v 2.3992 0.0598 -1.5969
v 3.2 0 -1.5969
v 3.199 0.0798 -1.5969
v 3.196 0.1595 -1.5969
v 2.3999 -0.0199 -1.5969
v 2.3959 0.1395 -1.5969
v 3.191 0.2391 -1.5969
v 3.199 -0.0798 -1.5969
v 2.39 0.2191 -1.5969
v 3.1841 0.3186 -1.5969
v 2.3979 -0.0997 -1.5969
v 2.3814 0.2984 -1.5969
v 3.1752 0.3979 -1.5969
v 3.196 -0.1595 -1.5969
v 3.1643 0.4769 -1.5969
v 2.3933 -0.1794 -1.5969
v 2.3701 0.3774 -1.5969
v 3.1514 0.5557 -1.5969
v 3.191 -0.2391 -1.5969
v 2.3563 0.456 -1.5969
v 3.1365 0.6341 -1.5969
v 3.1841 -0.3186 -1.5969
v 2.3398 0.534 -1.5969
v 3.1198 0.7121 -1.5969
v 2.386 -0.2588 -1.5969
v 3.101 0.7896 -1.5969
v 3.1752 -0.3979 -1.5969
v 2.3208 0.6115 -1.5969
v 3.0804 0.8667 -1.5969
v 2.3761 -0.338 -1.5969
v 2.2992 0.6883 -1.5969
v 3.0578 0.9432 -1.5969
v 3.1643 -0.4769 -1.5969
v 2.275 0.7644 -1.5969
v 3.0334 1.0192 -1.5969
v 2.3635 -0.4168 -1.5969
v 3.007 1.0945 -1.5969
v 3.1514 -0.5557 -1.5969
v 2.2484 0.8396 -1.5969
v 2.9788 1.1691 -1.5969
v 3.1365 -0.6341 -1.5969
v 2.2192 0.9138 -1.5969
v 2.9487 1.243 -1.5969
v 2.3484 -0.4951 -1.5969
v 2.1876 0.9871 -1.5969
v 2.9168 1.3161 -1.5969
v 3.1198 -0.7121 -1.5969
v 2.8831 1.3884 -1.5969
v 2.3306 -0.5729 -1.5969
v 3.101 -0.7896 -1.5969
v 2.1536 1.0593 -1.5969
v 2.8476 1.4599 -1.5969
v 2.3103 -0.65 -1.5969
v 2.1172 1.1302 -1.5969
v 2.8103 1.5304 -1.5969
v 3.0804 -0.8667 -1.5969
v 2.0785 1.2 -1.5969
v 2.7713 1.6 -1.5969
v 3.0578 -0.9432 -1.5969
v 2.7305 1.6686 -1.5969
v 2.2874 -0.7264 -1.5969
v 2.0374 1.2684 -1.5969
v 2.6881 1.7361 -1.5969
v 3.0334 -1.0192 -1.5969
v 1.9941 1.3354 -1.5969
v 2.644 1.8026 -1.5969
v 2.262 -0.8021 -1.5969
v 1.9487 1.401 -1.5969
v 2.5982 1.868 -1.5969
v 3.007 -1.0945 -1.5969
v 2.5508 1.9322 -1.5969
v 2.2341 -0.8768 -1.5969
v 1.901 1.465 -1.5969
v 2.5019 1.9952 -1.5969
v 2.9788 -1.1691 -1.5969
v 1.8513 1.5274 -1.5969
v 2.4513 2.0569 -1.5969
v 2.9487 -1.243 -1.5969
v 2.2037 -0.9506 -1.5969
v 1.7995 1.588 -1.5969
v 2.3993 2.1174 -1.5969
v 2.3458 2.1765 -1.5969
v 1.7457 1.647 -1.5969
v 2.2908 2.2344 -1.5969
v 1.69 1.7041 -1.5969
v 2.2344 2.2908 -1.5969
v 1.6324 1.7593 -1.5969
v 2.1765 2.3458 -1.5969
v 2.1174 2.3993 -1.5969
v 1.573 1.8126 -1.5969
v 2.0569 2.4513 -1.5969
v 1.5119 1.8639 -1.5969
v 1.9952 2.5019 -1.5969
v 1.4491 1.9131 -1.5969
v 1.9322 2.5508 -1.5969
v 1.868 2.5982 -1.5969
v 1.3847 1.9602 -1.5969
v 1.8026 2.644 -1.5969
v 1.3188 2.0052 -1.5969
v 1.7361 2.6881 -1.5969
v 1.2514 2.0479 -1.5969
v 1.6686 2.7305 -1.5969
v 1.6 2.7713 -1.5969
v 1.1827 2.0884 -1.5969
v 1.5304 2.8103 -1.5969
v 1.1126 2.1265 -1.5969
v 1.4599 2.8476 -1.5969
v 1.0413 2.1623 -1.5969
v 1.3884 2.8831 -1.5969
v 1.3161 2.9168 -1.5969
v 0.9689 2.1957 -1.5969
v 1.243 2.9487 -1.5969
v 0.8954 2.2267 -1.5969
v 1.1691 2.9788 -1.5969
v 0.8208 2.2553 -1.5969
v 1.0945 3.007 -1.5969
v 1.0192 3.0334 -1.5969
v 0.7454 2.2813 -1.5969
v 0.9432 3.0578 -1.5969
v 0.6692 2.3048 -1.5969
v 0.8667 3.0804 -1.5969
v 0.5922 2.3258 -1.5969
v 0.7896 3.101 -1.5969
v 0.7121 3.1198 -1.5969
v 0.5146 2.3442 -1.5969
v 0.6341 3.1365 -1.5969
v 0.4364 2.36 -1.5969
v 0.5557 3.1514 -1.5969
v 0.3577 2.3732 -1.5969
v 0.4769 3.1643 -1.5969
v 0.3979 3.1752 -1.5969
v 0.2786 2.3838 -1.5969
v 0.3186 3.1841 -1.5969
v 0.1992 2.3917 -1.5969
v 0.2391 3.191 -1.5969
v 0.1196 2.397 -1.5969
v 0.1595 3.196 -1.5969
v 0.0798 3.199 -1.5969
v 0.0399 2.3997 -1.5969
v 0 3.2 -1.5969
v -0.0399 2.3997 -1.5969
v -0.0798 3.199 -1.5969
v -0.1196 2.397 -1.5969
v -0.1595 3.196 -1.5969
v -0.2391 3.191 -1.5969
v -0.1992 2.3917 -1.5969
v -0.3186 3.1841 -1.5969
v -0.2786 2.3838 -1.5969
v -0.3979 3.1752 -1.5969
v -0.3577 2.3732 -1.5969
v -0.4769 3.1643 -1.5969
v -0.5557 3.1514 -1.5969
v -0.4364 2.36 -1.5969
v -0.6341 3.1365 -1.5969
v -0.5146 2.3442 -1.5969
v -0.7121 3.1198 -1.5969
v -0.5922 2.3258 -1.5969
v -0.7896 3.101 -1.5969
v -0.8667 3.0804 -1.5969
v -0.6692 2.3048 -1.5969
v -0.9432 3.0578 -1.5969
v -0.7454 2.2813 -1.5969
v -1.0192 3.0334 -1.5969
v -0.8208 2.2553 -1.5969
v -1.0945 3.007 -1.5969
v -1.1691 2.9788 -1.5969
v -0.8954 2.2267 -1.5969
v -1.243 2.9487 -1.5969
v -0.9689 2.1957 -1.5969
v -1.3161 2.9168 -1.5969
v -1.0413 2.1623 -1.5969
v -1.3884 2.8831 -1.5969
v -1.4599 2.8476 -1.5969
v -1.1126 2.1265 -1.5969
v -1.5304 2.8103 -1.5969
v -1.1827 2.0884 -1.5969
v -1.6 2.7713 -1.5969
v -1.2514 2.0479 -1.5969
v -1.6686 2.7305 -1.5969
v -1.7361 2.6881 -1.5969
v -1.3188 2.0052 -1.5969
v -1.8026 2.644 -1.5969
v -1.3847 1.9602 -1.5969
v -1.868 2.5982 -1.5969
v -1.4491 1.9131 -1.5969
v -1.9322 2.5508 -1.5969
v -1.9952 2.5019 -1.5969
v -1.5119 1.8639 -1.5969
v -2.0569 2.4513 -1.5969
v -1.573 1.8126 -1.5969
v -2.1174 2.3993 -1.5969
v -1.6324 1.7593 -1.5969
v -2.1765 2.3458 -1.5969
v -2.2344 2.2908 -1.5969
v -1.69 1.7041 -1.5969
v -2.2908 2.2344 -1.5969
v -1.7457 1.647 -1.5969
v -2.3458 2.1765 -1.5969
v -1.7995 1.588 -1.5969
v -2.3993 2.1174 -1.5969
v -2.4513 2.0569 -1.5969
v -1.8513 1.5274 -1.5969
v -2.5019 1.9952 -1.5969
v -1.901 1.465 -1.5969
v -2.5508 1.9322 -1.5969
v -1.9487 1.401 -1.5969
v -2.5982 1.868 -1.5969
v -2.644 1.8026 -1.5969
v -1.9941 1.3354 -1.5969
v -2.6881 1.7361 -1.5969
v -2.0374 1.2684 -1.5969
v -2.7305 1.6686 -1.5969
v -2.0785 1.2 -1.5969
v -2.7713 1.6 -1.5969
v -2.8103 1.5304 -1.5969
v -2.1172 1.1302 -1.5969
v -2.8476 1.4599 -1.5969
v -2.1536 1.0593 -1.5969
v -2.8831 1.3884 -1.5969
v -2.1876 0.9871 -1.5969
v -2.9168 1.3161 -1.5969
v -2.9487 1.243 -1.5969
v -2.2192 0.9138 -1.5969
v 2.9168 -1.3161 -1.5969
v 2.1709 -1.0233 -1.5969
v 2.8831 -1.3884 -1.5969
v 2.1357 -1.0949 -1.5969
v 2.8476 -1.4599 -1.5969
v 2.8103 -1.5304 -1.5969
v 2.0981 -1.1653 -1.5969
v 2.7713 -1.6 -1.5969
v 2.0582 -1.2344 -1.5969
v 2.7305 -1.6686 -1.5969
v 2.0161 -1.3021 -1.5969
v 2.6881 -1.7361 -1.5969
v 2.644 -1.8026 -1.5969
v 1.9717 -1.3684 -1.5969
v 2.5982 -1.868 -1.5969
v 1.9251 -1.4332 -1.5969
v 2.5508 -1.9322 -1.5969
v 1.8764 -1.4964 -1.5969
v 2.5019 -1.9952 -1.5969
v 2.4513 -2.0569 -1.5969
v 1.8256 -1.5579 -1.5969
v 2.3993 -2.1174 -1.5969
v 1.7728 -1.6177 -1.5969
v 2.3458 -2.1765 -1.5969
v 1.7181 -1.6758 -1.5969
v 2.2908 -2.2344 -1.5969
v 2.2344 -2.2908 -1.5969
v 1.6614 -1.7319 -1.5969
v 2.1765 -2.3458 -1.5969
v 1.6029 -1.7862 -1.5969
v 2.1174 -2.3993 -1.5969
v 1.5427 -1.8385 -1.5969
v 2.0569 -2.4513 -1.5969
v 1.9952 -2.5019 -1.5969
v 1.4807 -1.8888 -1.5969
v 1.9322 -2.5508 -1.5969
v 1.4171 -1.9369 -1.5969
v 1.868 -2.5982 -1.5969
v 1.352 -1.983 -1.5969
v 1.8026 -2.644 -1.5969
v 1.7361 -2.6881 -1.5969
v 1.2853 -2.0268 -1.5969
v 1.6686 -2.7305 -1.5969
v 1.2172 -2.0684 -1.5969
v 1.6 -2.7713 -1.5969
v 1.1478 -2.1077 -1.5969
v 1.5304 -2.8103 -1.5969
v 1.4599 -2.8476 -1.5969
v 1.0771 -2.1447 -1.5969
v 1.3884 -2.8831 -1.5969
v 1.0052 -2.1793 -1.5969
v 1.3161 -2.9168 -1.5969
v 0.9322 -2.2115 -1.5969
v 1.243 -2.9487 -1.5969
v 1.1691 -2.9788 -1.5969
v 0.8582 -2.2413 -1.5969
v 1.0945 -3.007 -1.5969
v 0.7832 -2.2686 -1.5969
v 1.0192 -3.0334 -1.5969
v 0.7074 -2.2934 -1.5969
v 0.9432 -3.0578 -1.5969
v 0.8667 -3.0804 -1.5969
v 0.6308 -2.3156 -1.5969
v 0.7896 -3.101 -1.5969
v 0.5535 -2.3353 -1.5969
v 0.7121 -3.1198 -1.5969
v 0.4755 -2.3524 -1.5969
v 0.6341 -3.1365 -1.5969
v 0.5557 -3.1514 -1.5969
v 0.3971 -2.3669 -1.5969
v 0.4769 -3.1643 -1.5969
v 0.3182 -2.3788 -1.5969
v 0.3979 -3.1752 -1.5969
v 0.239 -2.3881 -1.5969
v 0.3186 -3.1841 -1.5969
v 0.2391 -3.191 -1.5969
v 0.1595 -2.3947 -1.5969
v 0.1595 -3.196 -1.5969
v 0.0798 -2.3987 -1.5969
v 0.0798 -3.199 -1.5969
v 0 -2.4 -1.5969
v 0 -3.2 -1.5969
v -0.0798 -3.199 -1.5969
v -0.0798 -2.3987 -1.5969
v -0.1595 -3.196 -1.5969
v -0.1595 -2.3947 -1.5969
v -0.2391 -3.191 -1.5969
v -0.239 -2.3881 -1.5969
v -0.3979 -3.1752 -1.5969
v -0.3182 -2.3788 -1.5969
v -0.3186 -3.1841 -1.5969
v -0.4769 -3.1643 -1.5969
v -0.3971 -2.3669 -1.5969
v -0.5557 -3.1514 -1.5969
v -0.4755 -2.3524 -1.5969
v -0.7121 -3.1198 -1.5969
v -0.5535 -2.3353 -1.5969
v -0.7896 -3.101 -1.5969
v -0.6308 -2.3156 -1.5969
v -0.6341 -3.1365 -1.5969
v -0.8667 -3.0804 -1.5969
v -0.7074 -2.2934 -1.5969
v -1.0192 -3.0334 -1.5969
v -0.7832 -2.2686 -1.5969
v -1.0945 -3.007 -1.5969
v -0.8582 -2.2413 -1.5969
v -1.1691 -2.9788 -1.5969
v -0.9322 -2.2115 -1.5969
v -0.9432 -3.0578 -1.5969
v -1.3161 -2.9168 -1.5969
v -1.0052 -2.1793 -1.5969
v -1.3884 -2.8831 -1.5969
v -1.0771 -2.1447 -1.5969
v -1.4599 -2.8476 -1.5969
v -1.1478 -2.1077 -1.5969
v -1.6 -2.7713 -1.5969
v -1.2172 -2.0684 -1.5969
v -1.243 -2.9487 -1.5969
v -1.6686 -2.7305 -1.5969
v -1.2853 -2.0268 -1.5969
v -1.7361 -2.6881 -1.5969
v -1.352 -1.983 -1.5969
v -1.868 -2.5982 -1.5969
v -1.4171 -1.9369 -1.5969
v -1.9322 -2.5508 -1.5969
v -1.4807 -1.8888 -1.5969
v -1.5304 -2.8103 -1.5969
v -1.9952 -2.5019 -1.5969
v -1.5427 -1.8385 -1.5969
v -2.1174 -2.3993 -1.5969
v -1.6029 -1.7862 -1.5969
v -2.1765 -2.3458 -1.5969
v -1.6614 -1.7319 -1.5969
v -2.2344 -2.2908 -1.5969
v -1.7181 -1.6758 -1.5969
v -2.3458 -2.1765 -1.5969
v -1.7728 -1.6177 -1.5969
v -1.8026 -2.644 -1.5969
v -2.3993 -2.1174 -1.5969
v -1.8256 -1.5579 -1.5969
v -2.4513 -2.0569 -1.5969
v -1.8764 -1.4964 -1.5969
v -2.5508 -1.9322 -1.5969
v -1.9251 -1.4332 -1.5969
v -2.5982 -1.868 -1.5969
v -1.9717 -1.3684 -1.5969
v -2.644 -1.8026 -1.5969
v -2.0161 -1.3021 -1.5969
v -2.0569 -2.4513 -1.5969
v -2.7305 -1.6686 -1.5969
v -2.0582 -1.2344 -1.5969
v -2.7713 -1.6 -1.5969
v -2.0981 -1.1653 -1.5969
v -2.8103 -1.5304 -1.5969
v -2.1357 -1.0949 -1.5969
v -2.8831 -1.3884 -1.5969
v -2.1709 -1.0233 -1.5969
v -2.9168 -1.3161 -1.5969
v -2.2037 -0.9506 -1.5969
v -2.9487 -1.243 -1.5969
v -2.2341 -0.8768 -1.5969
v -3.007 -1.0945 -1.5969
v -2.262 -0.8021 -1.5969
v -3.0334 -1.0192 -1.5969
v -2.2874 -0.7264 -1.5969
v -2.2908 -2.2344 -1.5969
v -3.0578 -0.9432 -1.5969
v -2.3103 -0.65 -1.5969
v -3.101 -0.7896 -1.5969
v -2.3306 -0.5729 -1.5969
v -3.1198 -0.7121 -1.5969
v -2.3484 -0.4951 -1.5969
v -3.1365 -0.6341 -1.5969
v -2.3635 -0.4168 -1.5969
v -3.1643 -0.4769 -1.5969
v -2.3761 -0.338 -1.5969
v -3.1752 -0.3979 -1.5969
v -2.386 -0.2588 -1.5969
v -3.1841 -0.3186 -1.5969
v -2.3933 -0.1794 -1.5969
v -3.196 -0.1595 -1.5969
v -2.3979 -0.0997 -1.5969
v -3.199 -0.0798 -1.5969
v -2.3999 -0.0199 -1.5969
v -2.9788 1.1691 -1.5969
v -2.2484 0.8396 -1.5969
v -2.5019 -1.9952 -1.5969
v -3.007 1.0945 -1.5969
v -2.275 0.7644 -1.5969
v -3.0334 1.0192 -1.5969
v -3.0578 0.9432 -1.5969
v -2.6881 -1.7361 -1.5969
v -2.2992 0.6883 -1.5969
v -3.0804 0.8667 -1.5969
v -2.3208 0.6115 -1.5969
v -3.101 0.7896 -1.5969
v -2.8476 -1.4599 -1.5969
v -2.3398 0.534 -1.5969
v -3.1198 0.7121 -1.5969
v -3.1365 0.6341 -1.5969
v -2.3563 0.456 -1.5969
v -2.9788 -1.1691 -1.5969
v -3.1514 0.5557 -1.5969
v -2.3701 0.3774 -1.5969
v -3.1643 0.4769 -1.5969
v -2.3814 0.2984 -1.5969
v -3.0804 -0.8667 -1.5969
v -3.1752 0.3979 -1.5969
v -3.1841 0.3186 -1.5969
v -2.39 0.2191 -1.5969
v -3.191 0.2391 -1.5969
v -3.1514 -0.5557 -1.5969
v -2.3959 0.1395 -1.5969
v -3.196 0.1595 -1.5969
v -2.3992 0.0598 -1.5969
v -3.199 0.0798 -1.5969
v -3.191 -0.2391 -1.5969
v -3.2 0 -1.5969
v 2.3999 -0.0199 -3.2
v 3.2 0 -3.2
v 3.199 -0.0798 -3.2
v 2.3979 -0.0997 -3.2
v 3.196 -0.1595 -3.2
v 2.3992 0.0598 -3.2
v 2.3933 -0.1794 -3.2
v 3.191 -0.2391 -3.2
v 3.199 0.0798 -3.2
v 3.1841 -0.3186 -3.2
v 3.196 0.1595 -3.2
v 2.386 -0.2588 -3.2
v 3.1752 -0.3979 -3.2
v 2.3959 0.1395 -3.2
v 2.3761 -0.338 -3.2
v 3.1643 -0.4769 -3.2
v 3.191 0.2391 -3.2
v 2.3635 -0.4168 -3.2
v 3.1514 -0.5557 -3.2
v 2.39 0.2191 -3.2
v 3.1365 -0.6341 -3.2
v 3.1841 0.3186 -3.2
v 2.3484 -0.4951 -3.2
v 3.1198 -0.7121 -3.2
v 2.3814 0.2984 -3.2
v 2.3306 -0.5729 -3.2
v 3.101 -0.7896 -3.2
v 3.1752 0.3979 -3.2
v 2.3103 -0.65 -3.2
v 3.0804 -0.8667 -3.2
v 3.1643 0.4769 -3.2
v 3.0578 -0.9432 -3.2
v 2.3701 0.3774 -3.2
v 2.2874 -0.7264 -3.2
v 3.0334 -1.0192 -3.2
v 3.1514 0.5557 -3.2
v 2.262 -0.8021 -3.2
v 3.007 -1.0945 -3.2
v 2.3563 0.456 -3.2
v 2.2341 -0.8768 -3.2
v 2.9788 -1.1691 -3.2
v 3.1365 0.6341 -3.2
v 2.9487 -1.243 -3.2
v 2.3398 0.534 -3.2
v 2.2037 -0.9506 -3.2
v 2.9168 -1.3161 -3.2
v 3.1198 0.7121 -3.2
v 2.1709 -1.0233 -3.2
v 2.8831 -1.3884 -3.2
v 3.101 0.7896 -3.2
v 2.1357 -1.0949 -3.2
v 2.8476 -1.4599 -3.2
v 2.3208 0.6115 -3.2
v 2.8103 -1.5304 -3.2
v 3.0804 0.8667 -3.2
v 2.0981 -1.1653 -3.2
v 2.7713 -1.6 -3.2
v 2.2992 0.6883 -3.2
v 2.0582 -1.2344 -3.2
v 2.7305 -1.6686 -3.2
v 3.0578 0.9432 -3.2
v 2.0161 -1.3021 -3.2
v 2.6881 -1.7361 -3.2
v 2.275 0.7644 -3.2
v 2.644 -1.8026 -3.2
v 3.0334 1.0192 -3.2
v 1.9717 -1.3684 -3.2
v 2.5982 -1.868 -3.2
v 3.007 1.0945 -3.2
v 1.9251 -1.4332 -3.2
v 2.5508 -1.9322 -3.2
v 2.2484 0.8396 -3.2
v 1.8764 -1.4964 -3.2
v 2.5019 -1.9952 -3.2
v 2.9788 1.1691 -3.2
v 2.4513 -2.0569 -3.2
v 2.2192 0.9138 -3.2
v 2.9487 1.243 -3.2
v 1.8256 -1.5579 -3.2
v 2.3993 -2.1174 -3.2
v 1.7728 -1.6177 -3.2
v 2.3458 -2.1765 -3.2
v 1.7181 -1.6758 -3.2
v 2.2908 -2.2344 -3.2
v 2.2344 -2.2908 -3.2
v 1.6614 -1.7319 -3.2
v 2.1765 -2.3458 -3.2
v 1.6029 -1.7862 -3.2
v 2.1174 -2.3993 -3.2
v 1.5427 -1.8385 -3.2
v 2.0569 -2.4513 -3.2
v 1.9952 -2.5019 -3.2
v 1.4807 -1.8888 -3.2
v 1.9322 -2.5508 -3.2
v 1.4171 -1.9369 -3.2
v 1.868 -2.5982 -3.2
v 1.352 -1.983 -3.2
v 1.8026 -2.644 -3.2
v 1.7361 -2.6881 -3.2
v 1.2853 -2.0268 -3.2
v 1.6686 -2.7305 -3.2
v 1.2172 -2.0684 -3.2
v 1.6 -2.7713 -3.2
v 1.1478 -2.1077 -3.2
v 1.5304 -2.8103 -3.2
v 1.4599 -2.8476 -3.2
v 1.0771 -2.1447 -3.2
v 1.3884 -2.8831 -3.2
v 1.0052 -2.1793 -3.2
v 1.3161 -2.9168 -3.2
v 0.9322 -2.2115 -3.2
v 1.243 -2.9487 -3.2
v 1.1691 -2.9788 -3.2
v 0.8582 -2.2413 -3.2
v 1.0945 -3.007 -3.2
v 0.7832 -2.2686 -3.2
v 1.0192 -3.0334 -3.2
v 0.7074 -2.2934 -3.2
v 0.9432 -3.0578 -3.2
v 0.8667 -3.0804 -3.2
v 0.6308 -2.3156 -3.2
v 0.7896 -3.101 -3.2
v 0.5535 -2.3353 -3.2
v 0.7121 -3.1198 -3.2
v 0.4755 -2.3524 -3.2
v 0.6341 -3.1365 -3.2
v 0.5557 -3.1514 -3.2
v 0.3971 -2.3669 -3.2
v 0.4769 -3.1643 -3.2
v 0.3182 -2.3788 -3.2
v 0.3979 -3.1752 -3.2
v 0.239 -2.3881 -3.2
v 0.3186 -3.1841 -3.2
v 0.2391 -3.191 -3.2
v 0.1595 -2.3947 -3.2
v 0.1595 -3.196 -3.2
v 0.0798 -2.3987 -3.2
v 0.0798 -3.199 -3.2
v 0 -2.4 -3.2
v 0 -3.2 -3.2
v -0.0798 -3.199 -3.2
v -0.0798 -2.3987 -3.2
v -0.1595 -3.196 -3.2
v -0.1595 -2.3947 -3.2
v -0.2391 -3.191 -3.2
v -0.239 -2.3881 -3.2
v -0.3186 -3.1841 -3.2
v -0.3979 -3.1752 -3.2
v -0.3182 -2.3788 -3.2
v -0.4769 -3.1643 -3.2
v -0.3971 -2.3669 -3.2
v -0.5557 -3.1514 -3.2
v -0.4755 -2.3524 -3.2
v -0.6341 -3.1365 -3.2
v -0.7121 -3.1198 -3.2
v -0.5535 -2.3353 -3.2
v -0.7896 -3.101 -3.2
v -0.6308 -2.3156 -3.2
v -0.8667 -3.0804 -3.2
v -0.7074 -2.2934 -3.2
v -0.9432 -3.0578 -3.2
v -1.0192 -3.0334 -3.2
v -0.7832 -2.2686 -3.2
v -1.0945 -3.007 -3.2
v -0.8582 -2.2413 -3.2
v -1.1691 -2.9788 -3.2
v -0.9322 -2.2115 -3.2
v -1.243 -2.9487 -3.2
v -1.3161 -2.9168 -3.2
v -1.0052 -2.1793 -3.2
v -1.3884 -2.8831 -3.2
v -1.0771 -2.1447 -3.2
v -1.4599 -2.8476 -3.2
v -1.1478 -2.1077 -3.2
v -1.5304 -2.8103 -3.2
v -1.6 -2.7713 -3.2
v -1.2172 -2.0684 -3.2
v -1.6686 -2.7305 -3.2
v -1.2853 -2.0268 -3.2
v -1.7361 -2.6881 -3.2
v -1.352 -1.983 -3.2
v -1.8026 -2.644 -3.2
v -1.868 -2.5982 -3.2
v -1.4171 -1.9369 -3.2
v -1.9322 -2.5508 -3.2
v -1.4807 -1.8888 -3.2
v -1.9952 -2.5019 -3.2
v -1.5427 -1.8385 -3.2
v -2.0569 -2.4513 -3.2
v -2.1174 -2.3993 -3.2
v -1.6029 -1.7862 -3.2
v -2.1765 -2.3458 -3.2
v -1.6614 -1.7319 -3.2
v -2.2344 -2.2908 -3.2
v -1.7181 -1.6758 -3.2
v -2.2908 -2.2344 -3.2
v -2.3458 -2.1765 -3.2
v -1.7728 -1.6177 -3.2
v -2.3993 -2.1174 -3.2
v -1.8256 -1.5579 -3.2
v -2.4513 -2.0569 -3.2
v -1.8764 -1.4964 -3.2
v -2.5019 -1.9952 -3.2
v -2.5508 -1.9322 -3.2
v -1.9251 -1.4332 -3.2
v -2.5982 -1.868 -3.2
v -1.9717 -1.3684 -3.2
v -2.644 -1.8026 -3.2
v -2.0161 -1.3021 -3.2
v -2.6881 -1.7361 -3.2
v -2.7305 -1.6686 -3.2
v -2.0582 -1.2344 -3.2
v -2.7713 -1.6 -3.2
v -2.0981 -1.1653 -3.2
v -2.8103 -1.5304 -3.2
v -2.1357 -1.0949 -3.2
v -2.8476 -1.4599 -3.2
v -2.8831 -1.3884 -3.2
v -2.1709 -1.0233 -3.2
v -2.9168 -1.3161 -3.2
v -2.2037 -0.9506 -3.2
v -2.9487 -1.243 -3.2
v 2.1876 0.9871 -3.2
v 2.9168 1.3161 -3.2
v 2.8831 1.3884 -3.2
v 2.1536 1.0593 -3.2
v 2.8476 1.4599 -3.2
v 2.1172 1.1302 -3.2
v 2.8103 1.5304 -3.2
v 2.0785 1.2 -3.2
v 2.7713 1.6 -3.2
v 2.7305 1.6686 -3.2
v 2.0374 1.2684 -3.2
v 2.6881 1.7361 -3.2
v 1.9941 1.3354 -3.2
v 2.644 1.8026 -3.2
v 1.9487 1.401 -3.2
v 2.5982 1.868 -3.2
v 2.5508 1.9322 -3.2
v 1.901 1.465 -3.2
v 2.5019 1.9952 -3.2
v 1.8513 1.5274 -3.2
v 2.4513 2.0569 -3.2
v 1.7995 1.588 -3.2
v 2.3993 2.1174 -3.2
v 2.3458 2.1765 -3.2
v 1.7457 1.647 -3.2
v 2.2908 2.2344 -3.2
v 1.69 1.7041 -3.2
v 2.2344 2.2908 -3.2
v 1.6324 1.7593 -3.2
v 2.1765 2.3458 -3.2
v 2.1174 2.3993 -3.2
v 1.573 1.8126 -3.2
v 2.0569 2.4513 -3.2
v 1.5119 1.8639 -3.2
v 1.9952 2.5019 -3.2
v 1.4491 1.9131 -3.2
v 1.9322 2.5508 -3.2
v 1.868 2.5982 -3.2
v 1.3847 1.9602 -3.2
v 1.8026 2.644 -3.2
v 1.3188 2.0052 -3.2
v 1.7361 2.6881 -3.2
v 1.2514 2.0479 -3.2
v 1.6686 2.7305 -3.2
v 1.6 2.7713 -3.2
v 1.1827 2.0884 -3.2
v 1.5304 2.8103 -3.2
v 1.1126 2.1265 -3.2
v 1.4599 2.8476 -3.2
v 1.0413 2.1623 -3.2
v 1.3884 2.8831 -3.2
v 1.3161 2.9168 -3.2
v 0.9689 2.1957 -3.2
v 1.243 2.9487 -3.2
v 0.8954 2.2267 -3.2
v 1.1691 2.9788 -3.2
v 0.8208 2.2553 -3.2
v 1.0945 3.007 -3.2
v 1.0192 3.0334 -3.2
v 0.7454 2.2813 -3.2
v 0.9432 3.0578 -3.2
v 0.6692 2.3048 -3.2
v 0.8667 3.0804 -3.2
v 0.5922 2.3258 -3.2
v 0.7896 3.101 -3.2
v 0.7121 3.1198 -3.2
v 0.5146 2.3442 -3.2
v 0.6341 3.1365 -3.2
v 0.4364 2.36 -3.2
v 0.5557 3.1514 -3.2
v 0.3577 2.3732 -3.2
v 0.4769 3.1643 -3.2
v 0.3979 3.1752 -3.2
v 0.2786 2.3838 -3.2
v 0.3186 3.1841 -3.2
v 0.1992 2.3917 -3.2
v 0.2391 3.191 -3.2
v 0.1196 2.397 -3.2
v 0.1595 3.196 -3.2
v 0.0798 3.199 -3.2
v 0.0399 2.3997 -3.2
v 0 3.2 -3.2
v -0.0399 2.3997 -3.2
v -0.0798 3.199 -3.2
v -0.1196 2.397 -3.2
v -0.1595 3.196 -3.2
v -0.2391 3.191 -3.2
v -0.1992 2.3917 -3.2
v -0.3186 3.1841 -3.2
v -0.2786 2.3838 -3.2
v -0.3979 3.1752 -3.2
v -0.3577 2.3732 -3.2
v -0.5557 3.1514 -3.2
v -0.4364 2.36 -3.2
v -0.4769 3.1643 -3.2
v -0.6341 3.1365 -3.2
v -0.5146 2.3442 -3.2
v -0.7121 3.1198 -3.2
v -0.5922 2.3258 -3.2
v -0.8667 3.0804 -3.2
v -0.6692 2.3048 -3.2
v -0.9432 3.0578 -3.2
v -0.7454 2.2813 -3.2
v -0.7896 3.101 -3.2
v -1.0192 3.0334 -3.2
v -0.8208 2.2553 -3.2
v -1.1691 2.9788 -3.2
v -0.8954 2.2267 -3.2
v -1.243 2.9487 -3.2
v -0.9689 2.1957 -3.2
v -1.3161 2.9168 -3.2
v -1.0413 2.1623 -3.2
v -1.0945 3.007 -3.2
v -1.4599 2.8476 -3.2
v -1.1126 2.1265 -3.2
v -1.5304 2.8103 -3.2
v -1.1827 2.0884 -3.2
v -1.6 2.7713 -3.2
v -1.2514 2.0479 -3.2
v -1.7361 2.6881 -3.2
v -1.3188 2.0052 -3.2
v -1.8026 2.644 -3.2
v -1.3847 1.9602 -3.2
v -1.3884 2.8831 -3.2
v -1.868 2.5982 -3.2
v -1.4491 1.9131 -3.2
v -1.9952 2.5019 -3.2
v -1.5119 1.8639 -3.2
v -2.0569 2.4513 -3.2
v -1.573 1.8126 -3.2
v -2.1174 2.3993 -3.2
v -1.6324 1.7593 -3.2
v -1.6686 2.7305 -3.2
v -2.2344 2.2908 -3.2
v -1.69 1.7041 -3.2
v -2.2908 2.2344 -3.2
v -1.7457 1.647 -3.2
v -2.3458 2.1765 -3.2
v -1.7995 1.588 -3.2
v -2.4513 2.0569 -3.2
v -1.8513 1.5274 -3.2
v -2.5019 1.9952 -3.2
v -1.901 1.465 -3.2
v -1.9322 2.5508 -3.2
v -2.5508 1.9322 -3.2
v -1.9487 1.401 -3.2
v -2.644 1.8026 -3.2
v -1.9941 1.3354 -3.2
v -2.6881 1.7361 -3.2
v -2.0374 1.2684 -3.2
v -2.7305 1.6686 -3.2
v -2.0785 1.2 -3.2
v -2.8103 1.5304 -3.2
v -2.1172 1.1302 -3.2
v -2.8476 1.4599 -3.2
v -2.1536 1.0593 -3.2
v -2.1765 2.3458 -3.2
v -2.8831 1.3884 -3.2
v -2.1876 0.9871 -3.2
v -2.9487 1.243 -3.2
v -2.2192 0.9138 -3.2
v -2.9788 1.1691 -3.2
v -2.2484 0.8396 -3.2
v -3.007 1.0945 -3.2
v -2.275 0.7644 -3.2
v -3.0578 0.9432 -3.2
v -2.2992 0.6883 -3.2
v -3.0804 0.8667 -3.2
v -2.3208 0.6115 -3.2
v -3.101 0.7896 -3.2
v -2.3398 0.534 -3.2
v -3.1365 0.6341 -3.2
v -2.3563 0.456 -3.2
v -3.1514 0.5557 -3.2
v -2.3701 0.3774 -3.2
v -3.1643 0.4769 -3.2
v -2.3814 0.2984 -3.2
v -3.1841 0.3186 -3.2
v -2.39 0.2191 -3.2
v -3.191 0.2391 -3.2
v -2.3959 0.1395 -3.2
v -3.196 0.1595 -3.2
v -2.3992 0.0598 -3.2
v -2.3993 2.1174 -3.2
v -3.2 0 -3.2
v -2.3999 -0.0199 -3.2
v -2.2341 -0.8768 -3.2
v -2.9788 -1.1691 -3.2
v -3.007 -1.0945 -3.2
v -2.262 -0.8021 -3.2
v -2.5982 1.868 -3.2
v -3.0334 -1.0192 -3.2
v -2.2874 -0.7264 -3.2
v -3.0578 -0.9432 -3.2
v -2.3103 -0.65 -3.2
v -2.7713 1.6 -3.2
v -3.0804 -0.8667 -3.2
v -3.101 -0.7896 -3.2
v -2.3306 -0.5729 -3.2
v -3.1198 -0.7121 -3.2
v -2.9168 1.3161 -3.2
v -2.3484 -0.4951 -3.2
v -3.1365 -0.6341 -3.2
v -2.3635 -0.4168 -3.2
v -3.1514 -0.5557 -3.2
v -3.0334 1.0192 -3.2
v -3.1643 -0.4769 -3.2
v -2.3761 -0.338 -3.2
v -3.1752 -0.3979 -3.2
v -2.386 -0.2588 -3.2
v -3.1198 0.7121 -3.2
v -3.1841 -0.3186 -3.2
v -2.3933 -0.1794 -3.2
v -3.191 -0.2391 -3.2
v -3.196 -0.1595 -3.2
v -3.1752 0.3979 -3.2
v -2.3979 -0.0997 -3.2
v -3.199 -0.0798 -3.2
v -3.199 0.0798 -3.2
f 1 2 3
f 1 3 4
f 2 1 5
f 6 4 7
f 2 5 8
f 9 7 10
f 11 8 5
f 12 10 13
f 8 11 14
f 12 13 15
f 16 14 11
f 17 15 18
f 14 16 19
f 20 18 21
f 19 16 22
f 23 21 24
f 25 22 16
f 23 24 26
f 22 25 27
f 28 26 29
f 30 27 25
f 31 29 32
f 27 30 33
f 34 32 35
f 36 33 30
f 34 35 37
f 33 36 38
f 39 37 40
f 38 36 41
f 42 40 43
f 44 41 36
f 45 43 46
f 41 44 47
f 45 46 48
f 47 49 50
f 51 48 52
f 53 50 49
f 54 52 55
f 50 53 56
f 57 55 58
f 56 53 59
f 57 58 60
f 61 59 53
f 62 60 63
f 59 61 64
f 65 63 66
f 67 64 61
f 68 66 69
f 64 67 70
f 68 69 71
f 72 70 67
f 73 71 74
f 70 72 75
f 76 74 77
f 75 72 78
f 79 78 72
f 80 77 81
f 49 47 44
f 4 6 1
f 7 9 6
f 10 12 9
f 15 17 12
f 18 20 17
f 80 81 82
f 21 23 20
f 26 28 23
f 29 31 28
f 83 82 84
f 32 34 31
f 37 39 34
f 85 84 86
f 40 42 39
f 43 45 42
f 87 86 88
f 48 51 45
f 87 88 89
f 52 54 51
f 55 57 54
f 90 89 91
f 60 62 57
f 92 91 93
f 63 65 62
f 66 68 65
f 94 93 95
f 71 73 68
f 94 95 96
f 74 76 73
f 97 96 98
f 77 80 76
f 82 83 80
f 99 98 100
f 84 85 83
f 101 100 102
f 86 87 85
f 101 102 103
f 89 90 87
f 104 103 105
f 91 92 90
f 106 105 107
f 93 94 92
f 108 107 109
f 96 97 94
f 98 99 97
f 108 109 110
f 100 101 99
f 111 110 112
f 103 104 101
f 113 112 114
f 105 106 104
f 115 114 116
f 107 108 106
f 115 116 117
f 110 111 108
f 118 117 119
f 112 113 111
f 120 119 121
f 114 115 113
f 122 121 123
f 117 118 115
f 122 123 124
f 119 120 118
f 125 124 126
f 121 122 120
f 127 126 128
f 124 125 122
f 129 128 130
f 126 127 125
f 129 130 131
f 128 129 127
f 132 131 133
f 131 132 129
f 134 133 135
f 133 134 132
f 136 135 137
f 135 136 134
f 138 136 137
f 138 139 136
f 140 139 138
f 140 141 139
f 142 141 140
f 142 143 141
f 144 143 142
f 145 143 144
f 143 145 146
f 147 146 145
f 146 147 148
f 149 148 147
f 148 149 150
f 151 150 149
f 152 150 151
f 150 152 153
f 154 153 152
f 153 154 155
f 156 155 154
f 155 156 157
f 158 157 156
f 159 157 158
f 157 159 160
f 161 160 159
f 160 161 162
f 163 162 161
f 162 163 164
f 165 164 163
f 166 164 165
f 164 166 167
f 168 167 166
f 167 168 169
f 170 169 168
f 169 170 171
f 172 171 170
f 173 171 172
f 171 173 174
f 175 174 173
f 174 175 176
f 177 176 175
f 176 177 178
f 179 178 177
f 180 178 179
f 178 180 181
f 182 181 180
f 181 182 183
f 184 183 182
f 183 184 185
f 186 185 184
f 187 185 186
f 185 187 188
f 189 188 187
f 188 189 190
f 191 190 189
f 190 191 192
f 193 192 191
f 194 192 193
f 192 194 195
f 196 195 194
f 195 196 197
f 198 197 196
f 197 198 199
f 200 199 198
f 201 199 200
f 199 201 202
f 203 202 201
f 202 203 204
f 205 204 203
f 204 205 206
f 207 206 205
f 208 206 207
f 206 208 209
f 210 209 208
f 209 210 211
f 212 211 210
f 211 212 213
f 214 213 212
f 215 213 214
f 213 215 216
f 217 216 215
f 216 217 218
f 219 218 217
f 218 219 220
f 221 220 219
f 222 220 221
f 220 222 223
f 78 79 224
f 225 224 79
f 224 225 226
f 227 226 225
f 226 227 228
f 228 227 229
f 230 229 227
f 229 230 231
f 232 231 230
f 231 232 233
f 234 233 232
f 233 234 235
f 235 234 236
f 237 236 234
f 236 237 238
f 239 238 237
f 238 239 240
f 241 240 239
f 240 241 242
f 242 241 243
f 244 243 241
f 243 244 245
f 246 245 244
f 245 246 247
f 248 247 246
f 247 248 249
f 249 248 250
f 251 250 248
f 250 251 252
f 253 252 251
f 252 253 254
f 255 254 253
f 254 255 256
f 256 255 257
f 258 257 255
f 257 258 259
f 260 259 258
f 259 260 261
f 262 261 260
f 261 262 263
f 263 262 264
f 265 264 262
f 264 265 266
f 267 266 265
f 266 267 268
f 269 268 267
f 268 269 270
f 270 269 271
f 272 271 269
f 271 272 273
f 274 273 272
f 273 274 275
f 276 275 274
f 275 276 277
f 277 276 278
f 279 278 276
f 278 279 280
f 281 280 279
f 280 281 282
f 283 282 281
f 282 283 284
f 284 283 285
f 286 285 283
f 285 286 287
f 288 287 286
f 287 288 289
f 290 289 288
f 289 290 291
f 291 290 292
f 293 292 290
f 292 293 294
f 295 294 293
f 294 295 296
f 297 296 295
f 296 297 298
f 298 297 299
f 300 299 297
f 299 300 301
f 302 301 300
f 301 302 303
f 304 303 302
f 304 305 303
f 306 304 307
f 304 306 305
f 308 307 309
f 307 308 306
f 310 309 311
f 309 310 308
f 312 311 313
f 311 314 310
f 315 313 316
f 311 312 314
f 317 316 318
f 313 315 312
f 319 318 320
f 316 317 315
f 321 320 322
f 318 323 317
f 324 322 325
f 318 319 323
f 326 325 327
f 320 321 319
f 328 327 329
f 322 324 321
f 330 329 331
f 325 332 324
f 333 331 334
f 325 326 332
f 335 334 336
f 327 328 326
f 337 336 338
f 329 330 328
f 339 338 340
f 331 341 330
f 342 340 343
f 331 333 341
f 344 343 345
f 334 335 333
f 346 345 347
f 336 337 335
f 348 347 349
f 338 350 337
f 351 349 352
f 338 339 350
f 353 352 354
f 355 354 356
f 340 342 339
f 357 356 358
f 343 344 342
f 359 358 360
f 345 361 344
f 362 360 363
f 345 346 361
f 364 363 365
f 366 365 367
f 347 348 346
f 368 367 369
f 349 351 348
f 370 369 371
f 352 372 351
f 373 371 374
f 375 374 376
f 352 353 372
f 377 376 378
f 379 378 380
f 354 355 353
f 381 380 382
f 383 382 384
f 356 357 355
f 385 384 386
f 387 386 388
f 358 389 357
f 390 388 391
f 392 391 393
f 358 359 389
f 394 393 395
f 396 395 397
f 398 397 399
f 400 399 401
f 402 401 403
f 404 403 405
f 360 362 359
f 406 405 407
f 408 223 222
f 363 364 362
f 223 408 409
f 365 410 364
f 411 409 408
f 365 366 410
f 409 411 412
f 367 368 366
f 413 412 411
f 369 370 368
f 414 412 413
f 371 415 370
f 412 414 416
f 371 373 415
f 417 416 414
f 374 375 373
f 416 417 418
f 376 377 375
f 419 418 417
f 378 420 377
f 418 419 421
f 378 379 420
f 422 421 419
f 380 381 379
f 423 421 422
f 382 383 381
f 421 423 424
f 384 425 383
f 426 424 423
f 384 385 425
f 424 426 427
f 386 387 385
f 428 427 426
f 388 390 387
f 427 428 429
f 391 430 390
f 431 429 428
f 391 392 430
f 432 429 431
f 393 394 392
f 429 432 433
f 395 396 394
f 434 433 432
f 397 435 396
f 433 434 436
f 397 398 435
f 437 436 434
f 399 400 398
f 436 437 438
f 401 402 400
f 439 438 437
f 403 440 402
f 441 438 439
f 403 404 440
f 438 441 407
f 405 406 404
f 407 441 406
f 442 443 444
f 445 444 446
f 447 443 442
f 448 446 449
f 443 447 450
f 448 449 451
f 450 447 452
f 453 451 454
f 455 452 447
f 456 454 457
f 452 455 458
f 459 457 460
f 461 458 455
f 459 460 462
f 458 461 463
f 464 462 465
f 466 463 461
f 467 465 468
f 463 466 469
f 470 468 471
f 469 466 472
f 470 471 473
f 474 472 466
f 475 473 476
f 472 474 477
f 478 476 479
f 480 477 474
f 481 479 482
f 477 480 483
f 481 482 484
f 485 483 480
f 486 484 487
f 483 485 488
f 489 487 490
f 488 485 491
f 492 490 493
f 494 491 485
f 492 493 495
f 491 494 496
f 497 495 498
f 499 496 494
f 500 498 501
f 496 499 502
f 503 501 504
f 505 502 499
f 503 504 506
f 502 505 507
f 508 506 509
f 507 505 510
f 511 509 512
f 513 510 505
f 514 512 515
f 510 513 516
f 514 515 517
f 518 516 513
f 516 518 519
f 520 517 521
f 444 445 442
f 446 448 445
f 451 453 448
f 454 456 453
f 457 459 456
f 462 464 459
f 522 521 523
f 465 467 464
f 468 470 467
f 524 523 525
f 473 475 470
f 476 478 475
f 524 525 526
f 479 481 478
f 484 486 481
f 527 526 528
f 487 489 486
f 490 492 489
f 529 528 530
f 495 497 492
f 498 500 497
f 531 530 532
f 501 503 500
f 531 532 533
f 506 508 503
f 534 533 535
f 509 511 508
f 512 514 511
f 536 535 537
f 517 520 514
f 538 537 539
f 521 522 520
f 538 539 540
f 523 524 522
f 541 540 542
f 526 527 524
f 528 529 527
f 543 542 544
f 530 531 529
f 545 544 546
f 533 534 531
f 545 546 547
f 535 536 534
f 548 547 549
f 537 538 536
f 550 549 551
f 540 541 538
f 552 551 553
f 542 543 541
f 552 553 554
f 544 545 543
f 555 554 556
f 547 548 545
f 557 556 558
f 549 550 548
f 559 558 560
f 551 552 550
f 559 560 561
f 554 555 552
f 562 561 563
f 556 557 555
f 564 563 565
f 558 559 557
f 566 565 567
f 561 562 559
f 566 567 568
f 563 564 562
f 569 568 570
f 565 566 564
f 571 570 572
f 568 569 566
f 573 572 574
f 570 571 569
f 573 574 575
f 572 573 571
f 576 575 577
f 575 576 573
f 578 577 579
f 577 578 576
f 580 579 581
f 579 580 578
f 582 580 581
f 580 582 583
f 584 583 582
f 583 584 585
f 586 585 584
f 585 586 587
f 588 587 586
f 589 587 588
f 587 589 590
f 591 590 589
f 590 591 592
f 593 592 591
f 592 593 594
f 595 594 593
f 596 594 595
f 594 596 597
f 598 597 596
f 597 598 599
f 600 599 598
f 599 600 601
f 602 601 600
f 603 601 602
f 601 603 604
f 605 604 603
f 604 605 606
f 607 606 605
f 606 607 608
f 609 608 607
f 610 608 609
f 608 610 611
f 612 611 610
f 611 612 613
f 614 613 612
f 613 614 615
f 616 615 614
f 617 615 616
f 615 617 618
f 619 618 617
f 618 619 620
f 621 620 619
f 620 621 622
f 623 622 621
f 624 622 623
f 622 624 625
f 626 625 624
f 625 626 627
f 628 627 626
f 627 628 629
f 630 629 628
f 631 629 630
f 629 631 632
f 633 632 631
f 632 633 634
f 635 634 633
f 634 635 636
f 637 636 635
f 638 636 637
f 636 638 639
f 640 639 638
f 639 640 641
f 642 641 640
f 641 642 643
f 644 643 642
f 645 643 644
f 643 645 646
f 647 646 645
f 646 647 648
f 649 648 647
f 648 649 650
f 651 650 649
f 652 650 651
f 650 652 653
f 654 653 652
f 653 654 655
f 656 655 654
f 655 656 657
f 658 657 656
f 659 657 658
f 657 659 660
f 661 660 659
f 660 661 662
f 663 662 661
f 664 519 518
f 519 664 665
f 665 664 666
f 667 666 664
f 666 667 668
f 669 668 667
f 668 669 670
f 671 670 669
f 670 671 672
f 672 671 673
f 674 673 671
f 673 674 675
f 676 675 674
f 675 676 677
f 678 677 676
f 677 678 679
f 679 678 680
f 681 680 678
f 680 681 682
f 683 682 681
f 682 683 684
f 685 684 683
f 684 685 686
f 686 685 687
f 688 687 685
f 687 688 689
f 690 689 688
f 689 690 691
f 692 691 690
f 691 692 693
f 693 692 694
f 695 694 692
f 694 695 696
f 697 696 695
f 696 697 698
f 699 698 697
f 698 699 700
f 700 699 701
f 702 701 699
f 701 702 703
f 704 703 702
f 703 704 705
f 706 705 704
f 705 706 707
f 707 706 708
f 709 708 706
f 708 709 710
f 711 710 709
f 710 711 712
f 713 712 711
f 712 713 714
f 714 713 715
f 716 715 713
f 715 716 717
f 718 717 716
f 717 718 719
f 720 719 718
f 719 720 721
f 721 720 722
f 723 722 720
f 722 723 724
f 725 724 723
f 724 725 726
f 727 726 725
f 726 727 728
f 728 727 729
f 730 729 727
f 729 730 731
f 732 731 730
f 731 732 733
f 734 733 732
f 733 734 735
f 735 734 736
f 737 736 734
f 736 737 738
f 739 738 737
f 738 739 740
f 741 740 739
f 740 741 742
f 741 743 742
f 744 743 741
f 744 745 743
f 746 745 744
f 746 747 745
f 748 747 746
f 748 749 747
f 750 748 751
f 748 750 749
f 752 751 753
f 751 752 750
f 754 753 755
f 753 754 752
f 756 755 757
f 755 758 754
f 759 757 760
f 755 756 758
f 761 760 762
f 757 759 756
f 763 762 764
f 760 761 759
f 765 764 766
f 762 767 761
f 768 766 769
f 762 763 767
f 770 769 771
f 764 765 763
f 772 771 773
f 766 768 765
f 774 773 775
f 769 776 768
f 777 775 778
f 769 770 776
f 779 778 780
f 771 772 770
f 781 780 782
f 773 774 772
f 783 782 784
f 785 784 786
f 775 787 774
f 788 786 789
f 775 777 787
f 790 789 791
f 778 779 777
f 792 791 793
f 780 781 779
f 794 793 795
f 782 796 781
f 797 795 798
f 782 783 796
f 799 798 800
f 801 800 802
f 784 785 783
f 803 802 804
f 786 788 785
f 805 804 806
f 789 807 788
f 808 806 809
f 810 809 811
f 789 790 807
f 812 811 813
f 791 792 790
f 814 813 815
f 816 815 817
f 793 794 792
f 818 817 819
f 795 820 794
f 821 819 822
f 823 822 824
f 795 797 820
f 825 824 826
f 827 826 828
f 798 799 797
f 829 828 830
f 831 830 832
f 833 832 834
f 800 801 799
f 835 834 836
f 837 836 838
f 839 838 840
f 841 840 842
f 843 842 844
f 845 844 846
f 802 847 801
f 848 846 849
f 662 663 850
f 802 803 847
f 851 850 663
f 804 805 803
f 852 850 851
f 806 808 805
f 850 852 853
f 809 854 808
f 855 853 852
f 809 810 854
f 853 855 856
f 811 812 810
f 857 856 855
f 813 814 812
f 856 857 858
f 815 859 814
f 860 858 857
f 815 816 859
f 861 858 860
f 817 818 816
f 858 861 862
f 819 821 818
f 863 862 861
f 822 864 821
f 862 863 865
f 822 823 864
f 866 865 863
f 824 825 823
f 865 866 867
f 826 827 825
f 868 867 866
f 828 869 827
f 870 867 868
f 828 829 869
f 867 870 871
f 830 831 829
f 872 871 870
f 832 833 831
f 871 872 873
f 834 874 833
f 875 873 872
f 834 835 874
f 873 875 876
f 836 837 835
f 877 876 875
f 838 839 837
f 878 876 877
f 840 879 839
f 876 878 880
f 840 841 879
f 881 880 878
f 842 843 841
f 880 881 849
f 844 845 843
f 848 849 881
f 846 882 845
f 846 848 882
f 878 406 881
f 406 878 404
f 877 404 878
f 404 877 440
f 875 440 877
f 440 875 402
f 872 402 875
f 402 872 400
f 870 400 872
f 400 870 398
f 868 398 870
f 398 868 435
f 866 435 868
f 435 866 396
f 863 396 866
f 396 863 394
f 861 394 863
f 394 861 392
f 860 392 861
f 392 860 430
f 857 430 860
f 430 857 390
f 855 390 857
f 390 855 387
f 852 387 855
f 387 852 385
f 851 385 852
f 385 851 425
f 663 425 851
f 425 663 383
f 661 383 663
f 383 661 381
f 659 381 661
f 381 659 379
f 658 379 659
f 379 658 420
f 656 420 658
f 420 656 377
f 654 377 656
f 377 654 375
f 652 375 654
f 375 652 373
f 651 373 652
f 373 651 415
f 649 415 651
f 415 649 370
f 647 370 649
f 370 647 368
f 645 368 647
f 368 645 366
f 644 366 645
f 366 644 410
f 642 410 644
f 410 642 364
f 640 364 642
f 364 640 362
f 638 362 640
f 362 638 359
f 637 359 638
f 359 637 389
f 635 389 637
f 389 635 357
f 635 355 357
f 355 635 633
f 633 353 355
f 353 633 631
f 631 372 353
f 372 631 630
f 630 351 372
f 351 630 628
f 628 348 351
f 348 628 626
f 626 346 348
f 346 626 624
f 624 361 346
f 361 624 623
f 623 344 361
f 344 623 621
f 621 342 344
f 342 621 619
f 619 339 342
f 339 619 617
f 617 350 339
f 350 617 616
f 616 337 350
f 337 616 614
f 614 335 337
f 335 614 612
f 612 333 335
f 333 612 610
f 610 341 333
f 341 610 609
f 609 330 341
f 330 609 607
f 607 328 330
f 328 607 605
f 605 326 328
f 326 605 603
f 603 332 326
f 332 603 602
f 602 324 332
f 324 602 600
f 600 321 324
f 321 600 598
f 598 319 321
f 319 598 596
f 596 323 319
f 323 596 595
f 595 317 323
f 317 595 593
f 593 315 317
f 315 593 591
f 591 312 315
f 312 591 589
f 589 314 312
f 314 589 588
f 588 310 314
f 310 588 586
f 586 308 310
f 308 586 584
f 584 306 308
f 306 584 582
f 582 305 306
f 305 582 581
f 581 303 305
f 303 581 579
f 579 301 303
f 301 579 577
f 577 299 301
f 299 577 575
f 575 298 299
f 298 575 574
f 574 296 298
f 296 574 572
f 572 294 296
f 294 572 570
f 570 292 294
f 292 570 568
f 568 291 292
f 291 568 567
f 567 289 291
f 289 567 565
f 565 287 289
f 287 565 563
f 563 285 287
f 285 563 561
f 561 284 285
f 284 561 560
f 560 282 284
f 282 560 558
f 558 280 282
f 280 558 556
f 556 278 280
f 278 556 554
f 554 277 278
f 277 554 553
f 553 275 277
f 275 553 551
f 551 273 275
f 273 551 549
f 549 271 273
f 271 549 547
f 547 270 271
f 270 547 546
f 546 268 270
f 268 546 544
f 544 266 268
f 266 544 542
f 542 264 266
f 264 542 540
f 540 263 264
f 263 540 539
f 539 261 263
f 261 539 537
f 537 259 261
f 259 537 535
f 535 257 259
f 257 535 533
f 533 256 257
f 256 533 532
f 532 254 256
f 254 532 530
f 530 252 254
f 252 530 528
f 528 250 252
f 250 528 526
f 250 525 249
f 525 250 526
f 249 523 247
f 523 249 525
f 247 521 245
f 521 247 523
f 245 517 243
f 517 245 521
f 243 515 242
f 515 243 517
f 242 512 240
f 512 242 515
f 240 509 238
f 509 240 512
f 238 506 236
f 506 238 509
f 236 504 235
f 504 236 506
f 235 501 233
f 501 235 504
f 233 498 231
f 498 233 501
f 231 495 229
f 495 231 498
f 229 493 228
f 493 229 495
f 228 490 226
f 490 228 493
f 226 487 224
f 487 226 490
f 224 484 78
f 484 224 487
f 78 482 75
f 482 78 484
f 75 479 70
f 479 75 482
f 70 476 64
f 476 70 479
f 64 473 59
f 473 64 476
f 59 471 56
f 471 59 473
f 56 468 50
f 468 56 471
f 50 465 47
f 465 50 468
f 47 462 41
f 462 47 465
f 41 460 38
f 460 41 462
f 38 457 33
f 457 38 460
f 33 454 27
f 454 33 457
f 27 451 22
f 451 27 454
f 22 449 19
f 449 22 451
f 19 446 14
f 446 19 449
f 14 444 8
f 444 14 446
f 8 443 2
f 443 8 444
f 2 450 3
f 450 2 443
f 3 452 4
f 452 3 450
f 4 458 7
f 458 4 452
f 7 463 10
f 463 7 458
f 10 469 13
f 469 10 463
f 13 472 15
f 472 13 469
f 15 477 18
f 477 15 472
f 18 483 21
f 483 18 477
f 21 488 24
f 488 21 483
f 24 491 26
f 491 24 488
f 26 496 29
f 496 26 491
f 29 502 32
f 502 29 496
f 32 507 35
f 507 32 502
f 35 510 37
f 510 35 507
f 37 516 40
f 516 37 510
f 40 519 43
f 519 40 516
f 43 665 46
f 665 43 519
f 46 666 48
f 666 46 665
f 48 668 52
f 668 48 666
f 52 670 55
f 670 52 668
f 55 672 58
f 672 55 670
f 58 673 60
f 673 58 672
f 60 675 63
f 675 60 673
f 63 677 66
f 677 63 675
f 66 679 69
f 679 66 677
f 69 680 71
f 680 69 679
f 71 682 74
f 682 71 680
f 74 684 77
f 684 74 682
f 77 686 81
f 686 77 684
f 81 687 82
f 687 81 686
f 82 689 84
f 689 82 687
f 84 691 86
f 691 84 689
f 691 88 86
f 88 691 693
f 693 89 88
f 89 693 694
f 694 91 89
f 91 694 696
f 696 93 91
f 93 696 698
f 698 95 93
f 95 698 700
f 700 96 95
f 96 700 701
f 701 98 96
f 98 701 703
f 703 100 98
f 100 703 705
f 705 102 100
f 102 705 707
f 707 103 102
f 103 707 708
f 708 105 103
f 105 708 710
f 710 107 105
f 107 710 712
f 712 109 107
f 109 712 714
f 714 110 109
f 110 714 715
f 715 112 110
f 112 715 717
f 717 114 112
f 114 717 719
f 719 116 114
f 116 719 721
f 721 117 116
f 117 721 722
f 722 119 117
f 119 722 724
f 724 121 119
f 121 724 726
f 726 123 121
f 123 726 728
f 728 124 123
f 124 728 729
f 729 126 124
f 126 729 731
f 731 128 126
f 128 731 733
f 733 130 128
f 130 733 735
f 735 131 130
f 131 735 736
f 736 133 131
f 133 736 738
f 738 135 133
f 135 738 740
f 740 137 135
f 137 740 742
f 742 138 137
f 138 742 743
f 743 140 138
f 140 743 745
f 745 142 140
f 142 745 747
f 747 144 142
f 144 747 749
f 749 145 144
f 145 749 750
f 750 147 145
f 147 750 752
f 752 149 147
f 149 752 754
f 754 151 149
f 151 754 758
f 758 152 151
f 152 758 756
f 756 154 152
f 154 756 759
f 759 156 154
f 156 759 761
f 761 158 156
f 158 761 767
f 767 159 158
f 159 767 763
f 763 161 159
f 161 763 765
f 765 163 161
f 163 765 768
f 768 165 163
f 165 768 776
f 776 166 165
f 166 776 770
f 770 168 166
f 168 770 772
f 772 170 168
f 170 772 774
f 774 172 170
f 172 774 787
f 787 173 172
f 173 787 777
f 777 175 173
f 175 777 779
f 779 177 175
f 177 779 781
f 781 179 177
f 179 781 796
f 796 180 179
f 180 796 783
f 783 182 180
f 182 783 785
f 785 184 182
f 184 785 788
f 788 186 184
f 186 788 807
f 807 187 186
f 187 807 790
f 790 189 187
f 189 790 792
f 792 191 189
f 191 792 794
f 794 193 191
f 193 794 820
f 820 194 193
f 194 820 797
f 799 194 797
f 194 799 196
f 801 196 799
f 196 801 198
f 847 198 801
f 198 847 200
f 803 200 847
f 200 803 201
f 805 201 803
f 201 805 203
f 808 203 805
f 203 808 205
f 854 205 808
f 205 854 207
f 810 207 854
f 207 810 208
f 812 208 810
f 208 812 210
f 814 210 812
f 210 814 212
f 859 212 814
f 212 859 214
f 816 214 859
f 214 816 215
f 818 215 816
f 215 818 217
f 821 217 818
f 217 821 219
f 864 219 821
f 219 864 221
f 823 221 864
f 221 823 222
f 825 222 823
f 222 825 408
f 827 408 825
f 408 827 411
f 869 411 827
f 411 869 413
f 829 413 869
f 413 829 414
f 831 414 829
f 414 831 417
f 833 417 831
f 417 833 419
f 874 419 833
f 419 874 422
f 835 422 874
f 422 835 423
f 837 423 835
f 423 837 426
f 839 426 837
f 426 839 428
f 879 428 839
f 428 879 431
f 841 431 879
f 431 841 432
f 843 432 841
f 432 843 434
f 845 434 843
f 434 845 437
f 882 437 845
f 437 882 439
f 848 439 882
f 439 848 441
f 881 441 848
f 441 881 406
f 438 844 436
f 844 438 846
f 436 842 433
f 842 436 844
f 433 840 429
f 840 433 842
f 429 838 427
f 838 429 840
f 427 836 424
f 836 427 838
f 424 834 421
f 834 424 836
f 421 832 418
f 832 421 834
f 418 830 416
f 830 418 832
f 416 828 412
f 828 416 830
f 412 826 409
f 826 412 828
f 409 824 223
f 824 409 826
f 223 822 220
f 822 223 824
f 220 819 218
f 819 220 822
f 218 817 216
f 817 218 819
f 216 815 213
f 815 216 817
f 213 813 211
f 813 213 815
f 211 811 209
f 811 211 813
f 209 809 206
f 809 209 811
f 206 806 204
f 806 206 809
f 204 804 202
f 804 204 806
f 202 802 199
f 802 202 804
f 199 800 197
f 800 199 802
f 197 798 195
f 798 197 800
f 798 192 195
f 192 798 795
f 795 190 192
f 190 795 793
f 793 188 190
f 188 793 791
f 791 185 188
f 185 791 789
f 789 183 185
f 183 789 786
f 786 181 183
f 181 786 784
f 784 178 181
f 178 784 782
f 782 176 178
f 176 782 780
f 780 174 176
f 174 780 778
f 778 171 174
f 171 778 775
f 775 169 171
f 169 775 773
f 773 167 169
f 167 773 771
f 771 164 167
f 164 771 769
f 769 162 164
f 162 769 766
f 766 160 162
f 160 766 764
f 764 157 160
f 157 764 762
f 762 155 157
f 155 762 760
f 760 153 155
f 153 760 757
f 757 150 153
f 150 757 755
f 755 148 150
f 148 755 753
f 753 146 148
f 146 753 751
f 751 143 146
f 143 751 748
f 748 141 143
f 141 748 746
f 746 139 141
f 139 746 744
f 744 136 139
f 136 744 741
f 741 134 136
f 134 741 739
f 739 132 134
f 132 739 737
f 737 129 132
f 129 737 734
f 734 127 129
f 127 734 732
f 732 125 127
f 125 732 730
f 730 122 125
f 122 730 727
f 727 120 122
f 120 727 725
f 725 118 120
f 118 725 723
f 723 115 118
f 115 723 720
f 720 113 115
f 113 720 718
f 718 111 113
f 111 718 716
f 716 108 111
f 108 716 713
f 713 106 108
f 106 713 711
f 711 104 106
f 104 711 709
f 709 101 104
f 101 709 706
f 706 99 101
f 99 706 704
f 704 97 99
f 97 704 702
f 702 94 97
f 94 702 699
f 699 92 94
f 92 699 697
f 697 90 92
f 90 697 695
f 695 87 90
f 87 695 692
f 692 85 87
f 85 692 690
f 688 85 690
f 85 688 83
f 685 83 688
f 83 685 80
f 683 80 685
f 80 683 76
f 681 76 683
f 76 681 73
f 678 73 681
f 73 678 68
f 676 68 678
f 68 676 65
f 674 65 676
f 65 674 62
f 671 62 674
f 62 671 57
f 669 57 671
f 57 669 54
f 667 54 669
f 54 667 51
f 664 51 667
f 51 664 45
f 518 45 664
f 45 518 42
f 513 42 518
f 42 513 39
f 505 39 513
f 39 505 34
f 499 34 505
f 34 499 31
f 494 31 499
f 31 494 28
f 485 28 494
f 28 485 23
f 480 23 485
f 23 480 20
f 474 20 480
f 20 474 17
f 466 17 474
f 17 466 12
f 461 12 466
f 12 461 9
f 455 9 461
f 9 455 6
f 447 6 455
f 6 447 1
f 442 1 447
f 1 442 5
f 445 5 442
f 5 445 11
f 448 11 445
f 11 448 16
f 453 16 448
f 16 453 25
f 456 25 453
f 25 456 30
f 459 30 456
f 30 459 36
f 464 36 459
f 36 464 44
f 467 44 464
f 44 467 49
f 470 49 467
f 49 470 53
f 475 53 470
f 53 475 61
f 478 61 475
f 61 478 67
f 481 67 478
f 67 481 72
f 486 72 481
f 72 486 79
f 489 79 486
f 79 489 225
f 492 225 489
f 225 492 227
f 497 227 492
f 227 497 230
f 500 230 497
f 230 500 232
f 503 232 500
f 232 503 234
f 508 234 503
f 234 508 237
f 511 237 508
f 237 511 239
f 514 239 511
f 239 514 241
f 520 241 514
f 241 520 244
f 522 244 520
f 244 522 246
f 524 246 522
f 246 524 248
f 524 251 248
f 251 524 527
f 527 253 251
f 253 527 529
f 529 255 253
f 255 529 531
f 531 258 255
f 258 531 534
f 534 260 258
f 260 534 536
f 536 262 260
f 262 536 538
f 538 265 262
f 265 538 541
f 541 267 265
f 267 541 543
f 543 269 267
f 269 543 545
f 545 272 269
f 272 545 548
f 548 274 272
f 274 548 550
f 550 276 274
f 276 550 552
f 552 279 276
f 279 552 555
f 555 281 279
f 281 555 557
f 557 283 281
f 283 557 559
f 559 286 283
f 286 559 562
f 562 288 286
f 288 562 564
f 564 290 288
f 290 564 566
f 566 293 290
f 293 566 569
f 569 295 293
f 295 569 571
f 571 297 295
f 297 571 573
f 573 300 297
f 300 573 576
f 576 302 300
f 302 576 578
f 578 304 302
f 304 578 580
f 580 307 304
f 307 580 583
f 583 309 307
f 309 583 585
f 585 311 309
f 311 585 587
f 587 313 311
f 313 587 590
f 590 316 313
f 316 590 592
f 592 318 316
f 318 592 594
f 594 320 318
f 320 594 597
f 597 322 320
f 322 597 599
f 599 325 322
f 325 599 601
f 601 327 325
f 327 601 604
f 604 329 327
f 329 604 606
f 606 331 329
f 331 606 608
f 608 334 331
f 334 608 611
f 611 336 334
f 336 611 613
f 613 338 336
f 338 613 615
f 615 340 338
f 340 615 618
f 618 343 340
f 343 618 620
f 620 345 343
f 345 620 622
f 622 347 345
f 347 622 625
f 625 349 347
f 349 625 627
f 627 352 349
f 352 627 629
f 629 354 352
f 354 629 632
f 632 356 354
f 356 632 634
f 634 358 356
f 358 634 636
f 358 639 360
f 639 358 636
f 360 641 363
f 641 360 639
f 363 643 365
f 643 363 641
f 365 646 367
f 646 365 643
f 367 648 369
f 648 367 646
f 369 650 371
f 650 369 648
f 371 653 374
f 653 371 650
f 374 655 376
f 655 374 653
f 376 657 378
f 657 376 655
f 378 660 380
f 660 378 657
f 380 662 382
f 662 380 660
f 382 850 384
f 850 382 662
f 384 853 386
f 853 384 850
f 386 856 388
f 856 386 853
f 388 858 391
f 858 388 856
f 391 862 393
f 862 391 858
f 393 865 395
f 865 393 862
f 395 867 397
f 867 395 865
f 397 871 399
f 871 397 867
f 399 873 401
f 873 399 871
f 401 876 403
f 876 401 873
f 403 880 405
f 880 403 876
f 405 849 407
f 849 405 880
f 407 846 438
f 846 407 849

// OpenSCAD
use <../lib.scad>
use <14769pm1.scad>
$fa=1; $fs=0.2;
function ldraw_lib__20294(realsolid=false) = [
// 0 =Tile  2 x  2 Round with Round Underside Stud with Fire Element Pattern
// 0 Name: 20294.dat
// 0 Author: Rolf Osterthun [Rolf]
// 0 !LDRAW_ORG Part Alias UPDATE 2016-01
// 0 !LICENSE Licensed under CC BY 2.0 and CC BY 4.0 : see CAreadme.txt
// 
// 0 BFC CERTIFY CCW
  [0,"BFC","CERTIFY"],
  [0,"BFC","CCW"],
// 
// 0 !KEYWORDS Elves
// 
// 0 !HISTORY 2016-12-31 [PTadmin] Official Update 2016-01
// 
// 
// 0 // Alias of 14769pm1
// 
// 1 16 0 0 0 1 0 0 0 1 0 0 0 1 14769pm1.dat
  [1,16,0,0,0,1,0,0,0,1,0,0,0,1, ldraw_lib__14769pm1(realsolid)],
];
module ldraw_lib__20294(step=0, col=false, unit=2/5, alt=false, line=0.2, solid=!$preview)
    makepoly(ldraw_lib__20294(solid), step=step, col=col, unit=unit, alt=alt, line=line, solid=solid);
ldraw_lib__20294(line=0.2);
